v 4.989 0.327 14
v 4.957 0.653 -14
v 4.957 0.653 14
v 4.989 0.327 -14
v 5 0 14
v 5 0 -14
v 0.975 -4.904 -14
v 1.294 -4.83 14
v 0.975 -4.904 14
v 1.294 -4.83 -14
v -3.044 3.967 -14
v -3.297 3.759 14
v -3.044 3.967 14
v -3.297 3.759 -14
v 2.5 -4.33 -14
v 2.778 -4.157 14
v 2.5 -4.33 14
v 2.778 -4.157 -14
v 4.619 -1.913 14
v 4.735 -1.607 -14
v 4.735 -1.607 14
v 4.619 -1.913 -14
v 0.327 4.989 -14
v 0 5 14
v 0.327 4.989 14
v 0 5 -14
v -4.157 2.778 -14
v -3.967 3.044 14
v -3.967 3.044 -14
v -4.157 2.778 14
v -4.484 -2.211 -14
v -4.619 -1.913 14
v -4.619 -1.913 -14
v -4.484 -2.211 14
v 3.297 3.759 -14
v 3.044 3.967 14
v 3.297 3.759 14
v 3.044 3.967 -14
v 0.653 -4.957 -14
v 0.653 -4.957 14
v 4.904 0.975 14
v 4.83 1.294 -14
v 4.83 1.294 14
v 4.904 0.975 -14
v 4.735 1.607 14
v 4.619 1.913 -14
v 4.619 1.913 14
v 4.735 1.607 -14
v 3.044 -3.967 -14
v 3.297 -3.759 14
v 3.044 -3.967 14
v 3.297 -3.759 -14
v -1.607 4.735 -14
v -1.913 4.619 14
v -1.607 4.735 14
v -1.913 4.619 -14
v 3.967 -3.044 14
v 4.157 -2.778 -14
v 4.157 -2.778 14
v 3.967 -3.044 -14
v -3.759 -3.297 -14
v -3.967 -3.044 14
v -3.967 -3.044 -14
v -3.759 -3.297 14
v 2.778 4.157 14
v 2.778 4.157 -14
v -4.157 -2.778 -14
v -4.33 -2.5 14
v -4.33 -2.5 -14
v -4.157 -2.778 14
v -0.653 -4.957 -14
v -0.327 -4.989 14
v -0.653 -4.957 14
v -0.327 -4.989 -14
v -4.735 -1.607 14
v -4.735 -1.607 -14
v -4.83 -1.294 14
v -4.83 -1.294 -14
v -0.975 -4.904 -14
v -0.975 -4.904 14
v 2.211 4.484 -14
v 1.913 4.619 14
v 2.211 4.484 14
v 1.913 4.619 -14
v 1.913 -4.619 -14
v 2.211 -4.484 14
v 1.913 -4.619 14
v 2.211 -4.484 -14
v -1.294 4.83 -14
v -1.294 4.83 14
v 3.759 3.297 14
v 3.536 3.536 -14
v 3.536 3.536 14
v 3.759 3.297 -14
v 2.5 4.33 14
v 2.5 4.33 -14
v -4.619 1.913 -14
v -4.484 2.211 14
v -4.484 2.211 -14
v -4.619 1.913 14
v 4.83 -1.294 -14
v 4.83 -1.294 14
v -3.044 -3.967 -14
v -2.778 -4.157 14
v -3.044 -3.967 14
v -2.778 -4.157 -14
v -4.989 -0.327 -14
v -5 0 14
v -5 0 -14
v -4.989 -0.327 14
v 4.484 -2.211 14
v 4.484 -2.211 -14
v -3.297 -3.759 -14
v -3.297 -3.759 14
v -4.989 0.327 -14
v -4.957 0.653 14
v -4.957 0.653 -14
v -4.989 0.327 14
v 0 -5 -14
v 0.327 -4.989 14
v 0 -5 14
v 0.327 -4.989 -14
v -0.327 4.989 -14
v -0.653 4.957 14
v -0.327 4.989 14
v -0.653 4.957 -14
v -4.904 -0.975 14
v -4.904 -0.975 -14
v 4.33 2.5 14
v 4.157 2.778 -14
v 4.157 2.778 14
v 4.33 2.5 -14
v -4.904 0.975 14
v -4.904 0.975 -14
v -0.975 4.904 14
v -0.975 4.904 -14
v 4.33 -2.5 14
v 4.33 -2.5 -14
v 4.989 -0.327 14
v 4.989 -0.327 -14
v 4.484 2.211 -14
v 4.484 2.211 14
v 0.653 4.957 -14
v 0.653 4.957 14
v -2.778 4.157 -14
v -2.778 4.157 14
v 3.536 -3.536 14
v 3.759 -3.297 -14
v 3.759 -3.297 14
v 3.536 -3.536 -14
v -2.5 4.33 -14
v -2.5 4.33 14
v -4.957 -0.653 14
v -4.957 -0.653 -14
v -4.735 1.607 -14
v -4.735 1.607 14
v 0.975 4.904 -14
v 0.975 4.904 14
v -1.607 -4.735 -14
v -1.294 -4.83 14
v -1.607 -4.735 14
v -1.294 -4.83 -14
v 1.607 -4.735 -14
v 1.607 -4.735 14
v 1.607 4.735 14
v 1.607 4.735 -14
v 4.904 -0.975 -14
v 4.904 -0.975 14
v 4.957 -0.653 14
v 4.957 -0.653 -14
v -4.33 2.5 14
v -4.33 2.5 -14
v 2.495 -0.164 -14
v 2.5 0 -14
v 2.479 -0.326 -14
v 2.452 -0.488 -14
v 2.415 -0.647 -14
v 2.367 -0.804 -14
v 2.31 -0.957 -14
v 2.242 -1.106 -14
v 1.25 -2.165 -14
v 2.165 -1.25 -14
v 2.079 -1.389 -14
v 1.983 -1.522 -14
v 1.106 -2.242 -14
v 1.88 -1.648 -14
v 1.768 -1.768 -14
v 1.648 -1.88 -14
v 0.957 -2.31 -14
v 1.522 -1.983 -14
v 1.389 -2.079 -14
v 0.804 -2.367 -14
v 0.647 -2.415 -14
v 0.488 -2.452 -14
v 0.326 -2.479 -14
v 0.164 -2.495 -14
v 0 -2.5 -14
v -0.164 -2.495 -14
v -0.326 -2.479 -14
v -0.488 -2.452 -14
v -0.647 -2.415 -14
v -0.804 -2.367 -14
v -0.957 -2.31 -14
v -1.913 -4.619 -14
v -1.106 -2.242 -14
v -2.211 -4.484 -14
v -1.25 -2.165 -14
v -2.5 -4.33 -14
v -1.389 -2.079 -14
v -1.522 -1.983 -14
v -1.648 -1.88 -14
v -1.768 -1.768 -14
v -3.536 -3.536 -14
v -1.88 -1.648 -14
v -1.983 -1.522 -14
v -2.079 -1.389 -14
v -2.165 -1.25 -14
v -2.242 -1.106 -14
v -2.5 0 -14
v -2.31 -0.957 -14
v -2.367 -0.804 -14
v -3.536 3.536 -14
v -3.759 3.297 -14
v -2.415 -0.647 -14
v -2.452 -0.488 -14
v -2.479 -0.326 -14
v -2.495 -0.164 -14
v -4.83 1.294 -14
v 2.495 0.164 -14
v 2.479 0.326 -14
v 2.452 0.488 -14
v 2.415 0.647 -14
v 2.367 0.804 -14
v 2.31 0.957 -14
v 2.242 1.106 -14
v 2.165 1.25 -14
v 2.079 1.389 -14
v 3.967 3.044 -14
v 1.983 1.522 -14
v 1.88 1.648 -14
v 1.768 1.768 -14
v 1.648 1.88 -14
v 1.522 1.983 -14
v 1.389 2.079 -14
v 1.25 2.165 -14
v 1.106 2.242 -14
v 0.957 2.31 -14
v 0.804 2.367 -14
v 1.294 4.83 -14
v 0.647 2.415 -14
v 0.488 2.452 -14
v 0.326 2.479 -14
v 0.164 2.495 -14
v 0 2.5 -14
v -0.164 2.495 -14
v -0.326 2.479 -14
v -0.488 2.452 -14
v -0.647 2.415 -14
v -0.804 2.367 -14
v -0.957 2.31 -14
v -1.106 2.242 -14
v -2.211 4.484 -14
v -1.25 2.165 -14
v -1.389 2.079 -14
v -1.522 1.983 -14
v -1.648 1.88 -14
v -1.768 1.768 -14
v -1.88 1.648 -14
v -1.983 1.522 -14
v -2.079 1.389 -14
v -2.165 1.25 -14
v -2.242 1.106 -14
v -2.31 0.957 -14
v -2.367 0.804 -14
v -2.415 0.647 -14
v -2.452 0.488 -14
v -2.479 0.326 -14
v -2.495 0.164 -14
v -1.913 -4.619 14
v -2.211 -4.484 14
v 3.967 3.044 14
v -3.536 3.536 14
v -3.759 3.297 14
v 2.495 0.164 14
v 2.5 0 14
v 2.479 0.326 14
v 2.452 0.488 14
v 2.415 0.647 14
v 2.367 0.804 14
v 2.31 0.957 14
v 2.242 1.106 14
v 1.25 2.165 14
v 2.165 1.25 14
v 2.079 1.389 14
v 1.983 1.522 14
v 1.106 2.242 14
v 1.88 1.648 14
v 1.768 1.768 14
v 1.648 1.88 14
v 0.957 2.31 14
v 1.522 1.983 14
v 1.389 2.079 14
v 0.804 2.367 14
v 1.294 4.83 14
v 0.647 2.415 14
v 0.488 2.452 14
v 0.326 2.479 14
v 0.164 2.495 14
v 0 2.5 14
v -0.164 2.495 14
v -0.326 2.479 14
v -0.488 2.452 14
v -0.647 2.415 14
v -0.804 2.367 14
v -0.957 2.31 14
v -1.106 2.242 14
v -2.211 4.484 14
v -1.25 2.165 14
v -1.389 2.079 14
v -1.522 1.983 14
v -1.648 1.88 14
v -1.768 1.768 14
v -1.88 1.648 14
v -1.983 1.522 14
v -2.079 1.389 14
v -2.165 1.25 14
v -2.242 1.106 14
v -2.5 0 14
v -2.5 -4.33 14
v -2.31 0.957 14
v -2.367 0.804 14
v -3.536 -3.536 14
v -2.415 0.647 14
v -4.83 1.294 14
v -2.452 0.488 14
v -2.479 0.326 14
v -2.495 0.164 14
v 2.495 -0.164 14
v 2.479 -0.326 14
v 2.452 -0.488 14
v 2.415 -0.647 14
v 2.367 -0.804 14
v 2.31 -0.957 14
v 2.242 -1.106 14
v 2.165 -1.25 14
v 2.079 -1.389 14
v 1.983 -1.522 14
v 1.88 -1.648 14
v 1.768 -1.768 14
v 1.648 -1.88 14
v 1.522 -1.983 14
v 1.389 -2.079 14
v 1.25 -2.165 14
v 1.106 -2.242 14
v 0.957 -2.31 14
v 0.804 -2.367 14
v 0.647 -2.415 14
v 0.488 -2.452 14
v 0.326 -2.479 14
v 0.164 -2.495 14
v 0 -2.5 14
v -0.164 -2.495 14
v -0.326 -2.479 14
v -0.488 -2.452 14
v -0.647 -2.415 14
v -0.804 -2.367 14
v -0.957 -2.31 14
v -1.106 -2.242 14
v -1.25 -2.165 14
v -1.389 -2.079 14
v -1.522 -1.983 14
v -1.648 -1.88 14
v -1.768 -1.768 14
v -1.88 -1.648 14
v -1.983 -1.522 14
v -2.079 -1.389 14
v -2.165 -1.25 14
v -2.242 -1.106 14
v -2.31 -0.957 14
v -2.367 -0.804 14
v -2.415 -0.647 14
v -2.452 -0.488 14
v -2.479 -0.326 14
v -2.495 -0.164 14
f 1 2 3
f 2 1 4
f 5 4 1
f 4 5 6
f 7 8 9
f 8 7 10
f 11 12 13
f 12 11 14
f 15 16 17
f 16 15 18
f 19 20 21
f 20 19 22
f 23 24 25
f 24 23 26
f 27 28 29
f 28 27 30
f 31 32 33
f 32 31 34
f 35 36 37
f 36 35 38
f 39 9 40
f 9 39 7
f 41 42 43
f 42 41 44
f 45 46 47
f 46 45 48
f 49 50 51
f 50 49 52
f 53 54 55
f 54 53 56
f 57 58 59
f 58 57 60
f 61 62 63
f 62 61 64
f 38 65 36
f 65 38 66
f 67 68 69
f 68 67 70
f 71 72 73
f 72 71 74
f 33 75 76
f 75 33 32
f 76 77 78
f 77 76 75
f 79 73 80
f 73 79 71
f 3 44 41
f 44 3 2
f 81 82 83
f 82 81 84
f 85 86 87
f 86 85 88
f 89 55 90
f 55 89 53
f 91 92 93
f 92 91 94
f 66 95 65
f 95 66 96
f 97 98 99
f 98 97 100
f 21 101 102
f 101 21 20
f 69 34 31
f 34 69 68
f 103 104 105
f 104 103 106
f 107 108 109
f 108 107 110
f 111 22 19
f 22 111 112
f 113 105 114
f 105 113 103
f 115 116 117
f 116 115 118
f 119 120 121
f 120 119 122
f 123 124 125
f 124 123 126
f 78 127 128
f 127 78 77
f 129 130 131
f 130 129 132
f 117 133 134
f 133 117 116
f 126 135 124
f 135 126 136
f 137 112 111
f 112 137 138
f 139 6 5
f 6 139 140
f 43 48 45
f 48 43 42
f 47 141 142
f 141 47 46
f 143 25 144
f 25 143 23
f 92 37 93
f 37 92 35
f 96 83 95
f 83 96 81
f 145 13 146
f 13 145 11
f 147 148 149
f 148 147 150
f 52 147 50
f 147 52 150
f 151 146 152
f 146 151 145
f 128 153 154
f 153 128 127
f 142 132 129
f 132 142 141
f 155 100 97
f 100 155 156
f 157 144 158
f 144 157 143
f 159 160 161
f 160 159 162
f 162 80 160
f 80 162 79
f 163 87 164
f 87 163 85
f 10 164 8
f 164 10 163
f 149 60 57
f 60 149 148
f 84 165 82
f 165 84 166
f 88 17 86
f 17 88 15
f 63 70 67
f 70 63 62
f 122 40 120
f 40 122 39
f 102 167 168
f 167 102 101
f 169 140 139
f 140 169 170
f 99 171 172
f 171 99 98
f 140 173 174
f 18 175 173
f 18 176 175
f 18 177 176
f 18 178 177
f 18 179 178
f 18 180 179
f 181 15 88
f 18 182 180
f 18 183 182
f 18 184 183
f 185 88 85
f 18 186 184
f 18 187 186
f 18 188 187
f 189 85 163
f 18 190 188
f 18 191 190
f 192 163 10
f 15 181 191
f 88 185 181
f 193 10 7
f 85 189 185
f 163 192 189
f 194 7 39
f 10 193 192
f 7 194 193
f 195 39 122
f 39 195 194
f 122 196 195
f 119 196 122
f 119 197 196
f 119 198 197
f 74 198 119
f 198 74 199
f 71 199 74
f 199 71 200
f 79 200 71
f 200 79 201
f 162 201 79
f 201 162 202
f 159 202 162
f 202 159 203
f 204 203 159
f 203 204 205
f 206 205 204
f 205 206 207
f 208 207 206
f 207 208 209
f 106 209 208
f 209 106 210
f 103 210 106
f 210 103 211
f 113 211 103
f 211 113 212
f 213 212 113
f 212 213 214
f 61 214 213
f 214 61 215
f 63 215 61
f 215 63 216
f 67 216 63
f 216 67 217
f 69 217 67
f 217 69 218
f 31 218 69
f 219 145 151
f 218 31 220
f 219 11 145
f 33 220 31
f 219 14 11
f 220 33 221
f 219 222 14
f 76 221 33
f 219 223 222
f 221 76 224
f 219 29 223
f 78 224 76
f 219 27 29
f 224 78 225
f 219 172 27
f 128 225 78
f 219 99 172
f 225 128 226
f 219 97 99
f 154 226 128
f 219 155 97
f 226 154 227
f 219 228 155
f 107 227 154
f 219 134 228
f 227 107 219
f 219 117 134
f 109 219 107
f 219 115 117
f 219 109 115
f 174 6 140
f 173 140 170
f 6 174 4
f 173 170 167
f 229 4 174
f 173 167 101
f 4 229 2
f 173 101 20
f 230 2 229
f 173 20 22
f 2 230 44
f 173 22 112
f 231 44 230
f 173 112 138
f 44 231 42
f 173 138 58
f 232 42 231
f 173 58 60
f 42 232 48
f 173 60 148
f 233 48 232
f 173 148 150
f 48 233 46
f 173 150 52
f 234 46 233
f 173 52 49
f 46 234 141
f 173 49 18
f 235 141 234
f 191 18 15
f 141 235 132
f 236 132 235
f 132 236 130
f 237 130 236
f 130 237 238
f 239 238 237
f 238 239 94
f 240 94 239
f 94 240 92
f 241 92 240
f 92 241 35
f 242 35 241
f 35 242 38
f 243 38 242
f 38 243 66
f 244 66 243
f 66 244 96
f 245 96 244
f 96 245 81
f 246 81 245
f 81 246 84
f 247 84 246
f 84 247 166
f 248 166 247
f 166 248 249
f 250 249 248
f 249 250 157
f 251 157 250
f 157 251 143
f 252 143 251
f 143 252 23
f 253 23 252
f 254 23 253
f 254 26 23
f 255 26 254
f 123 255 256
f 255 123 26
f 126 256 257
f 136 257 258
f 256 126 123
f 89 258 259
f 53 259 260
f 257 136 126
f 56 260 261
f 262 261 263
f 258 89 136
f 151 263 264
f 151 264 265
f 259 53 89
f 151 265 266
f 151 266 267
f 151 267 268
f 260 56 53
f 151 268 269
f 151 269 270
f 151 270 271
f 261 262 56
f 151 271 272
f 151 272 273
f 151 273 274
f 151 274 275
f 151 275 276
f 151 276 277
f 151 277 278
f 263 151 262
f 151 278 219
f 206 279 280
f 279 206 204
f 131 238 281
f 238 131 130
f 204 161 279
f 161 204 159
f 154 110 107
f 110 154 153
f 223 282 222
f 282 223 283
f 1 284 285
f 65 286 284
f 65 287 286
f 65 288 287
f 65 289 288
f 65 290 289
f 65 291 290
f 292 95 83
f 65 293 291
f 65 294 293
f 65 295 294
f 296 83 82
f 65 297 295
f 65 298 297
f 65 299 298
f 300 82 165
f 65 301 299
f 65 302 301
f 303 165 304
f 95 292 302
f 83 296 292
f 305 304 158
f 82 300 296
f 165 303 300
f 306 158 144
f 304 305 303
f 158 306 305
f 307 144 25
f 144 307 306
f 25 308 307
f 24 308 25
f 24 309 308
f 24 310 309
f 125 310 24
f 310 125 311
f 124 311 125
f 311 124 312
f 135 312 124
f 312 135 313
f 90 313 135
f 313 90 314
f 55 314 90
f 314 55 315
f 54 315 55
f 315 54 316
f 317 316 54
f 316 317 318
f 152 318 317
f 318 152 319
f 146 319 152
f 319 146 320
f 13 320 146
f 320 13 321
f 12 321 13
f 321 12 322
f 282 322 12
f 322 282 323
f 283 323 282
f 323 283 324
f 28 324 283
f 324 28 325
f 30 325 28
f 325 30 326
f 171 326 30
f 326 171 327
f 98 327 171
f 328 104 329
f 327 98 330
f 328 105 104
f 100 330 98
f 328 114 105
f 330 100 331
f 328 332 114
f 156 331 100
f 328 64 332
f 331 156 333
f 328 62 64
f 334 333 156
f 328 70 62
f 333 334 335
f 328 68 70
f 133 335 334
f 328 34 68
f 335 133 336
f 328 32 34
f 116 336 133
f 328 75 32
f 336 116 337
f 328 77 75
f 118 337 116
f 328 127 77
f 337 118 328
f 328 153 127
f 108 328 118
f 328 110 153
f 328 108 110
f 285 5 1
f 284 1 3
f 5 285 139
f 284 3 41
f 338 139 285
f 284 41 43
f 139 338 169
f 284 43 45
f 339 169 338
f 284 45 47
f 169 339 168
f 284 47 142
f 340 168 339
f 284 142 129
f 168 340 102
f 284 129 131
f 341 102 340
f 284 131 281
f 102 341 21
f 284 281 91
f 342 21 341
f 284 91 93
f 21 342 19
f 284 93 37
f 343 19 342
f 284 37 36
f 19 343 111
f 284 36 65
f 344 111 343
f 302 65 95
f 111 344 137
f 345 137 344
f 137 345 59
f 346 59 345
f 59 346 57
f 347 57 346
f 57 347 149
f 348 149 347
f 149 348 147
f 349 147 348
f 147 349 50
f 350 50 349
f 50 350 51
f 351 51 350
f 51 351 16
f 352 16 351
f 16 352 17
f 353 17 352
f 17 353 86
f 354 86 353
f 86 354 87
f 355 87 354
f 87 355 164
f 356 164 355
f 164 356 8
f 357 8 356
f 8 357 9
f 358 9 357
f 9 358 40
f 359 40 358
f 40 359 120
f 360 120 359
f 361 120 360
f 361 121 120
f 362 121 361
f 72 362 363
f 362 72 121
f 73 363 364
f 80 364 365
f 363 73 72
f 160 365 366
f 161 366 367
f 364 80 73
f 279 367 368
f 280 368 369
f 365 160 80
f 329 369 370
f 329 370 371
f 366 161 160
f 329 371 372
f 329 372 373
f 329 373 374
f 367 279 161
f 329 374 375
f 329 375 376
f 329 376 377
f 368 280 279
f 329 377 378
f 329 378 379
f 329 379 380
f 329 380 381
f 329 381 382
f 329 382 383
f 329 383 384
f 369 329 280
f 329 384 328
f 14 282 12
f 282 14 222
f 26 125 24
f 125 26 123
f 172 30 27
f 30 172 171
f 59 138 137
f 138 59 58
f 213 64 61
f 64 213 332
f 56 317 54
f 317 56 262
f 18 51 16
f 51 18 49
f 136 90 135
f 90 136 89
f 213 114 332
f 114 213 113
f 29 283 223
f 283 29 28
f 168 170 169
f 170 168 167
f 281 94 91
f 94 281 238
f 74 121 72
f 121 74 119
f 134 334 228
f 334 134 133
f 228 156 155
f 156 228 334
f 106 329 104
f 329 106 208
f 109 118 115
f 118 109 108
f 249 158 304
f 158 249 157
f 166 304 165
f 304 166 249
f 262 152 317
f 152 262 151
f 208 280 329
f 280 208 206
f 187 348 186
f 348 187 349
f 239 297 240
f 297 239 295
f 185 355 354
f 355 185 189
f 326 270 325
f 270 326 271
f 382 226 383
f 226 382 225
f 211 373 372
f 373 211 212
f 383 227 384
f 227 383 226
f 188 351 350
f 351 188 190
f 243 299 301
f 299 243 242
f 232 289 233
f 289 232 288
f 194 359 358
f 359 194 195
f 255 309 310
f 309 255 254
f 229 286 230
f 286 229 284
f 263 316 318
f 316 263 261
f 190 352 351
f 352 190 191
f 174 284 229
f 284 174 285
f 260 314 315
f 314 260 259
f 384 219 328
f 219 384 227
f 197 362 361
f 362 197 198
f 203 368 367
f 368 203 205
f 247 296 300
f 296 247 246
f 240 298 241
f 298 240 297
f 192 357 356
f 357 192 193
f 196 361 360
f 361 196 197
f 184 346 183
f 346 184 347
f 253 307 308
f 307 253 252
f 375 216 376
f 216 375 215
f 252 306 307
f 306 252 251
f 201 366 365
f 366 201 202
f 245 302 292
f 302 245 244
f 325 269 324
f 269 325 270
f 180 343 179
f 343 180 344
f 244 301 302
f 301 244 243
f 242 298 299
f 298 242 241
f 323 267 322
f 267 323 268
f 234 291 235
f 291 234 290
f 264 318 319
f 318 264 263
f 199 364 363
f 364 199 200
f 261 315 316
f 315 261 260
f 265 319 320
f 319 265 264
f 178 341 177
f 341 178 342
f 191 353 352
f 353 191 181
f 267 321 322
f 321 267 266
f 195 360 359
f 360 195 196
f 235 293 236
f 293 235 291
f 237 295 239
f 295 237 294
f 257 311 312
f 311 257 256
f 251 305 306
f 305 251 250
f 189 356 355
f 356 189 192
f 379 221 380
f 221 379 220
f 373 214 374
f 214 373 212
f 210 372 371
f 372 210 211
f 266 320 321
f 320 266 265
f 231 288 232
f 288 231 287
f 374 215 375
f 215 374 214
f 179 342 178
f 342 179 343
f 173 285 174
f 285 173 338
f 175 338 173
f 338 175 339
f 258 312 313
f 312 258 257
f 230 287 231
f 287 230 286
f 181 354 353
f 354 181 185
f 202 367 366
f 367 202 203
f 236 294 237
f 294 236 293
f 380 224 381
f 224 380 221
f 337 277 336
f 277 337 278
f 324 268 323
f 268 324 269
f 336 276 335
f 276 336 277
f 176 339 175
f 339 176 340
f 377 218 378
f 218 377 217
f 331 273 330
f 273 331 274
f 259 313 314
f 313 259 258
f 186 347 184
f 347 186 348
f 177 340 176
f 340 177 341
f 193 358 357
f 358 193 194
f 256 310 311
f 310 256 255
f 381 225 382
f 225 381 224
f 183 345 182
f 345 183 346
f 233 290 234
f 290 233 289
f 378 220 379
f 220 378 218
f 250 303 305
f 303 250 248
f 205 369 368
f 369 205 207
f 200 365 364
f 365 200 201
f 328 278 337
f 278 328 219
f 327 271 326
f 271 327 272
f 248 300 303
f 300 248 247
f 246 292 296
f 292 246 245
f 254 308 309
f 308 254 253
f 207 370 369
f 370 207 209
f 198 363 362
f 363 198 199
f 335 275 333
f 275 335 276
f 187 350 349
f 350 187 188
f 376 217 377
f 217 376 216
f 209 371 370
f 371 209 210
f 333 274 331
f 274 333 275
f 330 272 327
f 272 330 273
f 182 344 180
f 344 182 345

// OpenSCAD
$fn=96;

module linear_bearing(bore_d=5.0, od=10.0, len=28.0) {
    difference() {
        cylinder(d=od, h=len, center=true);
        cylinder(d=bore_d, h=len+0.4, center=true);
    }
}

linear_bearing();
